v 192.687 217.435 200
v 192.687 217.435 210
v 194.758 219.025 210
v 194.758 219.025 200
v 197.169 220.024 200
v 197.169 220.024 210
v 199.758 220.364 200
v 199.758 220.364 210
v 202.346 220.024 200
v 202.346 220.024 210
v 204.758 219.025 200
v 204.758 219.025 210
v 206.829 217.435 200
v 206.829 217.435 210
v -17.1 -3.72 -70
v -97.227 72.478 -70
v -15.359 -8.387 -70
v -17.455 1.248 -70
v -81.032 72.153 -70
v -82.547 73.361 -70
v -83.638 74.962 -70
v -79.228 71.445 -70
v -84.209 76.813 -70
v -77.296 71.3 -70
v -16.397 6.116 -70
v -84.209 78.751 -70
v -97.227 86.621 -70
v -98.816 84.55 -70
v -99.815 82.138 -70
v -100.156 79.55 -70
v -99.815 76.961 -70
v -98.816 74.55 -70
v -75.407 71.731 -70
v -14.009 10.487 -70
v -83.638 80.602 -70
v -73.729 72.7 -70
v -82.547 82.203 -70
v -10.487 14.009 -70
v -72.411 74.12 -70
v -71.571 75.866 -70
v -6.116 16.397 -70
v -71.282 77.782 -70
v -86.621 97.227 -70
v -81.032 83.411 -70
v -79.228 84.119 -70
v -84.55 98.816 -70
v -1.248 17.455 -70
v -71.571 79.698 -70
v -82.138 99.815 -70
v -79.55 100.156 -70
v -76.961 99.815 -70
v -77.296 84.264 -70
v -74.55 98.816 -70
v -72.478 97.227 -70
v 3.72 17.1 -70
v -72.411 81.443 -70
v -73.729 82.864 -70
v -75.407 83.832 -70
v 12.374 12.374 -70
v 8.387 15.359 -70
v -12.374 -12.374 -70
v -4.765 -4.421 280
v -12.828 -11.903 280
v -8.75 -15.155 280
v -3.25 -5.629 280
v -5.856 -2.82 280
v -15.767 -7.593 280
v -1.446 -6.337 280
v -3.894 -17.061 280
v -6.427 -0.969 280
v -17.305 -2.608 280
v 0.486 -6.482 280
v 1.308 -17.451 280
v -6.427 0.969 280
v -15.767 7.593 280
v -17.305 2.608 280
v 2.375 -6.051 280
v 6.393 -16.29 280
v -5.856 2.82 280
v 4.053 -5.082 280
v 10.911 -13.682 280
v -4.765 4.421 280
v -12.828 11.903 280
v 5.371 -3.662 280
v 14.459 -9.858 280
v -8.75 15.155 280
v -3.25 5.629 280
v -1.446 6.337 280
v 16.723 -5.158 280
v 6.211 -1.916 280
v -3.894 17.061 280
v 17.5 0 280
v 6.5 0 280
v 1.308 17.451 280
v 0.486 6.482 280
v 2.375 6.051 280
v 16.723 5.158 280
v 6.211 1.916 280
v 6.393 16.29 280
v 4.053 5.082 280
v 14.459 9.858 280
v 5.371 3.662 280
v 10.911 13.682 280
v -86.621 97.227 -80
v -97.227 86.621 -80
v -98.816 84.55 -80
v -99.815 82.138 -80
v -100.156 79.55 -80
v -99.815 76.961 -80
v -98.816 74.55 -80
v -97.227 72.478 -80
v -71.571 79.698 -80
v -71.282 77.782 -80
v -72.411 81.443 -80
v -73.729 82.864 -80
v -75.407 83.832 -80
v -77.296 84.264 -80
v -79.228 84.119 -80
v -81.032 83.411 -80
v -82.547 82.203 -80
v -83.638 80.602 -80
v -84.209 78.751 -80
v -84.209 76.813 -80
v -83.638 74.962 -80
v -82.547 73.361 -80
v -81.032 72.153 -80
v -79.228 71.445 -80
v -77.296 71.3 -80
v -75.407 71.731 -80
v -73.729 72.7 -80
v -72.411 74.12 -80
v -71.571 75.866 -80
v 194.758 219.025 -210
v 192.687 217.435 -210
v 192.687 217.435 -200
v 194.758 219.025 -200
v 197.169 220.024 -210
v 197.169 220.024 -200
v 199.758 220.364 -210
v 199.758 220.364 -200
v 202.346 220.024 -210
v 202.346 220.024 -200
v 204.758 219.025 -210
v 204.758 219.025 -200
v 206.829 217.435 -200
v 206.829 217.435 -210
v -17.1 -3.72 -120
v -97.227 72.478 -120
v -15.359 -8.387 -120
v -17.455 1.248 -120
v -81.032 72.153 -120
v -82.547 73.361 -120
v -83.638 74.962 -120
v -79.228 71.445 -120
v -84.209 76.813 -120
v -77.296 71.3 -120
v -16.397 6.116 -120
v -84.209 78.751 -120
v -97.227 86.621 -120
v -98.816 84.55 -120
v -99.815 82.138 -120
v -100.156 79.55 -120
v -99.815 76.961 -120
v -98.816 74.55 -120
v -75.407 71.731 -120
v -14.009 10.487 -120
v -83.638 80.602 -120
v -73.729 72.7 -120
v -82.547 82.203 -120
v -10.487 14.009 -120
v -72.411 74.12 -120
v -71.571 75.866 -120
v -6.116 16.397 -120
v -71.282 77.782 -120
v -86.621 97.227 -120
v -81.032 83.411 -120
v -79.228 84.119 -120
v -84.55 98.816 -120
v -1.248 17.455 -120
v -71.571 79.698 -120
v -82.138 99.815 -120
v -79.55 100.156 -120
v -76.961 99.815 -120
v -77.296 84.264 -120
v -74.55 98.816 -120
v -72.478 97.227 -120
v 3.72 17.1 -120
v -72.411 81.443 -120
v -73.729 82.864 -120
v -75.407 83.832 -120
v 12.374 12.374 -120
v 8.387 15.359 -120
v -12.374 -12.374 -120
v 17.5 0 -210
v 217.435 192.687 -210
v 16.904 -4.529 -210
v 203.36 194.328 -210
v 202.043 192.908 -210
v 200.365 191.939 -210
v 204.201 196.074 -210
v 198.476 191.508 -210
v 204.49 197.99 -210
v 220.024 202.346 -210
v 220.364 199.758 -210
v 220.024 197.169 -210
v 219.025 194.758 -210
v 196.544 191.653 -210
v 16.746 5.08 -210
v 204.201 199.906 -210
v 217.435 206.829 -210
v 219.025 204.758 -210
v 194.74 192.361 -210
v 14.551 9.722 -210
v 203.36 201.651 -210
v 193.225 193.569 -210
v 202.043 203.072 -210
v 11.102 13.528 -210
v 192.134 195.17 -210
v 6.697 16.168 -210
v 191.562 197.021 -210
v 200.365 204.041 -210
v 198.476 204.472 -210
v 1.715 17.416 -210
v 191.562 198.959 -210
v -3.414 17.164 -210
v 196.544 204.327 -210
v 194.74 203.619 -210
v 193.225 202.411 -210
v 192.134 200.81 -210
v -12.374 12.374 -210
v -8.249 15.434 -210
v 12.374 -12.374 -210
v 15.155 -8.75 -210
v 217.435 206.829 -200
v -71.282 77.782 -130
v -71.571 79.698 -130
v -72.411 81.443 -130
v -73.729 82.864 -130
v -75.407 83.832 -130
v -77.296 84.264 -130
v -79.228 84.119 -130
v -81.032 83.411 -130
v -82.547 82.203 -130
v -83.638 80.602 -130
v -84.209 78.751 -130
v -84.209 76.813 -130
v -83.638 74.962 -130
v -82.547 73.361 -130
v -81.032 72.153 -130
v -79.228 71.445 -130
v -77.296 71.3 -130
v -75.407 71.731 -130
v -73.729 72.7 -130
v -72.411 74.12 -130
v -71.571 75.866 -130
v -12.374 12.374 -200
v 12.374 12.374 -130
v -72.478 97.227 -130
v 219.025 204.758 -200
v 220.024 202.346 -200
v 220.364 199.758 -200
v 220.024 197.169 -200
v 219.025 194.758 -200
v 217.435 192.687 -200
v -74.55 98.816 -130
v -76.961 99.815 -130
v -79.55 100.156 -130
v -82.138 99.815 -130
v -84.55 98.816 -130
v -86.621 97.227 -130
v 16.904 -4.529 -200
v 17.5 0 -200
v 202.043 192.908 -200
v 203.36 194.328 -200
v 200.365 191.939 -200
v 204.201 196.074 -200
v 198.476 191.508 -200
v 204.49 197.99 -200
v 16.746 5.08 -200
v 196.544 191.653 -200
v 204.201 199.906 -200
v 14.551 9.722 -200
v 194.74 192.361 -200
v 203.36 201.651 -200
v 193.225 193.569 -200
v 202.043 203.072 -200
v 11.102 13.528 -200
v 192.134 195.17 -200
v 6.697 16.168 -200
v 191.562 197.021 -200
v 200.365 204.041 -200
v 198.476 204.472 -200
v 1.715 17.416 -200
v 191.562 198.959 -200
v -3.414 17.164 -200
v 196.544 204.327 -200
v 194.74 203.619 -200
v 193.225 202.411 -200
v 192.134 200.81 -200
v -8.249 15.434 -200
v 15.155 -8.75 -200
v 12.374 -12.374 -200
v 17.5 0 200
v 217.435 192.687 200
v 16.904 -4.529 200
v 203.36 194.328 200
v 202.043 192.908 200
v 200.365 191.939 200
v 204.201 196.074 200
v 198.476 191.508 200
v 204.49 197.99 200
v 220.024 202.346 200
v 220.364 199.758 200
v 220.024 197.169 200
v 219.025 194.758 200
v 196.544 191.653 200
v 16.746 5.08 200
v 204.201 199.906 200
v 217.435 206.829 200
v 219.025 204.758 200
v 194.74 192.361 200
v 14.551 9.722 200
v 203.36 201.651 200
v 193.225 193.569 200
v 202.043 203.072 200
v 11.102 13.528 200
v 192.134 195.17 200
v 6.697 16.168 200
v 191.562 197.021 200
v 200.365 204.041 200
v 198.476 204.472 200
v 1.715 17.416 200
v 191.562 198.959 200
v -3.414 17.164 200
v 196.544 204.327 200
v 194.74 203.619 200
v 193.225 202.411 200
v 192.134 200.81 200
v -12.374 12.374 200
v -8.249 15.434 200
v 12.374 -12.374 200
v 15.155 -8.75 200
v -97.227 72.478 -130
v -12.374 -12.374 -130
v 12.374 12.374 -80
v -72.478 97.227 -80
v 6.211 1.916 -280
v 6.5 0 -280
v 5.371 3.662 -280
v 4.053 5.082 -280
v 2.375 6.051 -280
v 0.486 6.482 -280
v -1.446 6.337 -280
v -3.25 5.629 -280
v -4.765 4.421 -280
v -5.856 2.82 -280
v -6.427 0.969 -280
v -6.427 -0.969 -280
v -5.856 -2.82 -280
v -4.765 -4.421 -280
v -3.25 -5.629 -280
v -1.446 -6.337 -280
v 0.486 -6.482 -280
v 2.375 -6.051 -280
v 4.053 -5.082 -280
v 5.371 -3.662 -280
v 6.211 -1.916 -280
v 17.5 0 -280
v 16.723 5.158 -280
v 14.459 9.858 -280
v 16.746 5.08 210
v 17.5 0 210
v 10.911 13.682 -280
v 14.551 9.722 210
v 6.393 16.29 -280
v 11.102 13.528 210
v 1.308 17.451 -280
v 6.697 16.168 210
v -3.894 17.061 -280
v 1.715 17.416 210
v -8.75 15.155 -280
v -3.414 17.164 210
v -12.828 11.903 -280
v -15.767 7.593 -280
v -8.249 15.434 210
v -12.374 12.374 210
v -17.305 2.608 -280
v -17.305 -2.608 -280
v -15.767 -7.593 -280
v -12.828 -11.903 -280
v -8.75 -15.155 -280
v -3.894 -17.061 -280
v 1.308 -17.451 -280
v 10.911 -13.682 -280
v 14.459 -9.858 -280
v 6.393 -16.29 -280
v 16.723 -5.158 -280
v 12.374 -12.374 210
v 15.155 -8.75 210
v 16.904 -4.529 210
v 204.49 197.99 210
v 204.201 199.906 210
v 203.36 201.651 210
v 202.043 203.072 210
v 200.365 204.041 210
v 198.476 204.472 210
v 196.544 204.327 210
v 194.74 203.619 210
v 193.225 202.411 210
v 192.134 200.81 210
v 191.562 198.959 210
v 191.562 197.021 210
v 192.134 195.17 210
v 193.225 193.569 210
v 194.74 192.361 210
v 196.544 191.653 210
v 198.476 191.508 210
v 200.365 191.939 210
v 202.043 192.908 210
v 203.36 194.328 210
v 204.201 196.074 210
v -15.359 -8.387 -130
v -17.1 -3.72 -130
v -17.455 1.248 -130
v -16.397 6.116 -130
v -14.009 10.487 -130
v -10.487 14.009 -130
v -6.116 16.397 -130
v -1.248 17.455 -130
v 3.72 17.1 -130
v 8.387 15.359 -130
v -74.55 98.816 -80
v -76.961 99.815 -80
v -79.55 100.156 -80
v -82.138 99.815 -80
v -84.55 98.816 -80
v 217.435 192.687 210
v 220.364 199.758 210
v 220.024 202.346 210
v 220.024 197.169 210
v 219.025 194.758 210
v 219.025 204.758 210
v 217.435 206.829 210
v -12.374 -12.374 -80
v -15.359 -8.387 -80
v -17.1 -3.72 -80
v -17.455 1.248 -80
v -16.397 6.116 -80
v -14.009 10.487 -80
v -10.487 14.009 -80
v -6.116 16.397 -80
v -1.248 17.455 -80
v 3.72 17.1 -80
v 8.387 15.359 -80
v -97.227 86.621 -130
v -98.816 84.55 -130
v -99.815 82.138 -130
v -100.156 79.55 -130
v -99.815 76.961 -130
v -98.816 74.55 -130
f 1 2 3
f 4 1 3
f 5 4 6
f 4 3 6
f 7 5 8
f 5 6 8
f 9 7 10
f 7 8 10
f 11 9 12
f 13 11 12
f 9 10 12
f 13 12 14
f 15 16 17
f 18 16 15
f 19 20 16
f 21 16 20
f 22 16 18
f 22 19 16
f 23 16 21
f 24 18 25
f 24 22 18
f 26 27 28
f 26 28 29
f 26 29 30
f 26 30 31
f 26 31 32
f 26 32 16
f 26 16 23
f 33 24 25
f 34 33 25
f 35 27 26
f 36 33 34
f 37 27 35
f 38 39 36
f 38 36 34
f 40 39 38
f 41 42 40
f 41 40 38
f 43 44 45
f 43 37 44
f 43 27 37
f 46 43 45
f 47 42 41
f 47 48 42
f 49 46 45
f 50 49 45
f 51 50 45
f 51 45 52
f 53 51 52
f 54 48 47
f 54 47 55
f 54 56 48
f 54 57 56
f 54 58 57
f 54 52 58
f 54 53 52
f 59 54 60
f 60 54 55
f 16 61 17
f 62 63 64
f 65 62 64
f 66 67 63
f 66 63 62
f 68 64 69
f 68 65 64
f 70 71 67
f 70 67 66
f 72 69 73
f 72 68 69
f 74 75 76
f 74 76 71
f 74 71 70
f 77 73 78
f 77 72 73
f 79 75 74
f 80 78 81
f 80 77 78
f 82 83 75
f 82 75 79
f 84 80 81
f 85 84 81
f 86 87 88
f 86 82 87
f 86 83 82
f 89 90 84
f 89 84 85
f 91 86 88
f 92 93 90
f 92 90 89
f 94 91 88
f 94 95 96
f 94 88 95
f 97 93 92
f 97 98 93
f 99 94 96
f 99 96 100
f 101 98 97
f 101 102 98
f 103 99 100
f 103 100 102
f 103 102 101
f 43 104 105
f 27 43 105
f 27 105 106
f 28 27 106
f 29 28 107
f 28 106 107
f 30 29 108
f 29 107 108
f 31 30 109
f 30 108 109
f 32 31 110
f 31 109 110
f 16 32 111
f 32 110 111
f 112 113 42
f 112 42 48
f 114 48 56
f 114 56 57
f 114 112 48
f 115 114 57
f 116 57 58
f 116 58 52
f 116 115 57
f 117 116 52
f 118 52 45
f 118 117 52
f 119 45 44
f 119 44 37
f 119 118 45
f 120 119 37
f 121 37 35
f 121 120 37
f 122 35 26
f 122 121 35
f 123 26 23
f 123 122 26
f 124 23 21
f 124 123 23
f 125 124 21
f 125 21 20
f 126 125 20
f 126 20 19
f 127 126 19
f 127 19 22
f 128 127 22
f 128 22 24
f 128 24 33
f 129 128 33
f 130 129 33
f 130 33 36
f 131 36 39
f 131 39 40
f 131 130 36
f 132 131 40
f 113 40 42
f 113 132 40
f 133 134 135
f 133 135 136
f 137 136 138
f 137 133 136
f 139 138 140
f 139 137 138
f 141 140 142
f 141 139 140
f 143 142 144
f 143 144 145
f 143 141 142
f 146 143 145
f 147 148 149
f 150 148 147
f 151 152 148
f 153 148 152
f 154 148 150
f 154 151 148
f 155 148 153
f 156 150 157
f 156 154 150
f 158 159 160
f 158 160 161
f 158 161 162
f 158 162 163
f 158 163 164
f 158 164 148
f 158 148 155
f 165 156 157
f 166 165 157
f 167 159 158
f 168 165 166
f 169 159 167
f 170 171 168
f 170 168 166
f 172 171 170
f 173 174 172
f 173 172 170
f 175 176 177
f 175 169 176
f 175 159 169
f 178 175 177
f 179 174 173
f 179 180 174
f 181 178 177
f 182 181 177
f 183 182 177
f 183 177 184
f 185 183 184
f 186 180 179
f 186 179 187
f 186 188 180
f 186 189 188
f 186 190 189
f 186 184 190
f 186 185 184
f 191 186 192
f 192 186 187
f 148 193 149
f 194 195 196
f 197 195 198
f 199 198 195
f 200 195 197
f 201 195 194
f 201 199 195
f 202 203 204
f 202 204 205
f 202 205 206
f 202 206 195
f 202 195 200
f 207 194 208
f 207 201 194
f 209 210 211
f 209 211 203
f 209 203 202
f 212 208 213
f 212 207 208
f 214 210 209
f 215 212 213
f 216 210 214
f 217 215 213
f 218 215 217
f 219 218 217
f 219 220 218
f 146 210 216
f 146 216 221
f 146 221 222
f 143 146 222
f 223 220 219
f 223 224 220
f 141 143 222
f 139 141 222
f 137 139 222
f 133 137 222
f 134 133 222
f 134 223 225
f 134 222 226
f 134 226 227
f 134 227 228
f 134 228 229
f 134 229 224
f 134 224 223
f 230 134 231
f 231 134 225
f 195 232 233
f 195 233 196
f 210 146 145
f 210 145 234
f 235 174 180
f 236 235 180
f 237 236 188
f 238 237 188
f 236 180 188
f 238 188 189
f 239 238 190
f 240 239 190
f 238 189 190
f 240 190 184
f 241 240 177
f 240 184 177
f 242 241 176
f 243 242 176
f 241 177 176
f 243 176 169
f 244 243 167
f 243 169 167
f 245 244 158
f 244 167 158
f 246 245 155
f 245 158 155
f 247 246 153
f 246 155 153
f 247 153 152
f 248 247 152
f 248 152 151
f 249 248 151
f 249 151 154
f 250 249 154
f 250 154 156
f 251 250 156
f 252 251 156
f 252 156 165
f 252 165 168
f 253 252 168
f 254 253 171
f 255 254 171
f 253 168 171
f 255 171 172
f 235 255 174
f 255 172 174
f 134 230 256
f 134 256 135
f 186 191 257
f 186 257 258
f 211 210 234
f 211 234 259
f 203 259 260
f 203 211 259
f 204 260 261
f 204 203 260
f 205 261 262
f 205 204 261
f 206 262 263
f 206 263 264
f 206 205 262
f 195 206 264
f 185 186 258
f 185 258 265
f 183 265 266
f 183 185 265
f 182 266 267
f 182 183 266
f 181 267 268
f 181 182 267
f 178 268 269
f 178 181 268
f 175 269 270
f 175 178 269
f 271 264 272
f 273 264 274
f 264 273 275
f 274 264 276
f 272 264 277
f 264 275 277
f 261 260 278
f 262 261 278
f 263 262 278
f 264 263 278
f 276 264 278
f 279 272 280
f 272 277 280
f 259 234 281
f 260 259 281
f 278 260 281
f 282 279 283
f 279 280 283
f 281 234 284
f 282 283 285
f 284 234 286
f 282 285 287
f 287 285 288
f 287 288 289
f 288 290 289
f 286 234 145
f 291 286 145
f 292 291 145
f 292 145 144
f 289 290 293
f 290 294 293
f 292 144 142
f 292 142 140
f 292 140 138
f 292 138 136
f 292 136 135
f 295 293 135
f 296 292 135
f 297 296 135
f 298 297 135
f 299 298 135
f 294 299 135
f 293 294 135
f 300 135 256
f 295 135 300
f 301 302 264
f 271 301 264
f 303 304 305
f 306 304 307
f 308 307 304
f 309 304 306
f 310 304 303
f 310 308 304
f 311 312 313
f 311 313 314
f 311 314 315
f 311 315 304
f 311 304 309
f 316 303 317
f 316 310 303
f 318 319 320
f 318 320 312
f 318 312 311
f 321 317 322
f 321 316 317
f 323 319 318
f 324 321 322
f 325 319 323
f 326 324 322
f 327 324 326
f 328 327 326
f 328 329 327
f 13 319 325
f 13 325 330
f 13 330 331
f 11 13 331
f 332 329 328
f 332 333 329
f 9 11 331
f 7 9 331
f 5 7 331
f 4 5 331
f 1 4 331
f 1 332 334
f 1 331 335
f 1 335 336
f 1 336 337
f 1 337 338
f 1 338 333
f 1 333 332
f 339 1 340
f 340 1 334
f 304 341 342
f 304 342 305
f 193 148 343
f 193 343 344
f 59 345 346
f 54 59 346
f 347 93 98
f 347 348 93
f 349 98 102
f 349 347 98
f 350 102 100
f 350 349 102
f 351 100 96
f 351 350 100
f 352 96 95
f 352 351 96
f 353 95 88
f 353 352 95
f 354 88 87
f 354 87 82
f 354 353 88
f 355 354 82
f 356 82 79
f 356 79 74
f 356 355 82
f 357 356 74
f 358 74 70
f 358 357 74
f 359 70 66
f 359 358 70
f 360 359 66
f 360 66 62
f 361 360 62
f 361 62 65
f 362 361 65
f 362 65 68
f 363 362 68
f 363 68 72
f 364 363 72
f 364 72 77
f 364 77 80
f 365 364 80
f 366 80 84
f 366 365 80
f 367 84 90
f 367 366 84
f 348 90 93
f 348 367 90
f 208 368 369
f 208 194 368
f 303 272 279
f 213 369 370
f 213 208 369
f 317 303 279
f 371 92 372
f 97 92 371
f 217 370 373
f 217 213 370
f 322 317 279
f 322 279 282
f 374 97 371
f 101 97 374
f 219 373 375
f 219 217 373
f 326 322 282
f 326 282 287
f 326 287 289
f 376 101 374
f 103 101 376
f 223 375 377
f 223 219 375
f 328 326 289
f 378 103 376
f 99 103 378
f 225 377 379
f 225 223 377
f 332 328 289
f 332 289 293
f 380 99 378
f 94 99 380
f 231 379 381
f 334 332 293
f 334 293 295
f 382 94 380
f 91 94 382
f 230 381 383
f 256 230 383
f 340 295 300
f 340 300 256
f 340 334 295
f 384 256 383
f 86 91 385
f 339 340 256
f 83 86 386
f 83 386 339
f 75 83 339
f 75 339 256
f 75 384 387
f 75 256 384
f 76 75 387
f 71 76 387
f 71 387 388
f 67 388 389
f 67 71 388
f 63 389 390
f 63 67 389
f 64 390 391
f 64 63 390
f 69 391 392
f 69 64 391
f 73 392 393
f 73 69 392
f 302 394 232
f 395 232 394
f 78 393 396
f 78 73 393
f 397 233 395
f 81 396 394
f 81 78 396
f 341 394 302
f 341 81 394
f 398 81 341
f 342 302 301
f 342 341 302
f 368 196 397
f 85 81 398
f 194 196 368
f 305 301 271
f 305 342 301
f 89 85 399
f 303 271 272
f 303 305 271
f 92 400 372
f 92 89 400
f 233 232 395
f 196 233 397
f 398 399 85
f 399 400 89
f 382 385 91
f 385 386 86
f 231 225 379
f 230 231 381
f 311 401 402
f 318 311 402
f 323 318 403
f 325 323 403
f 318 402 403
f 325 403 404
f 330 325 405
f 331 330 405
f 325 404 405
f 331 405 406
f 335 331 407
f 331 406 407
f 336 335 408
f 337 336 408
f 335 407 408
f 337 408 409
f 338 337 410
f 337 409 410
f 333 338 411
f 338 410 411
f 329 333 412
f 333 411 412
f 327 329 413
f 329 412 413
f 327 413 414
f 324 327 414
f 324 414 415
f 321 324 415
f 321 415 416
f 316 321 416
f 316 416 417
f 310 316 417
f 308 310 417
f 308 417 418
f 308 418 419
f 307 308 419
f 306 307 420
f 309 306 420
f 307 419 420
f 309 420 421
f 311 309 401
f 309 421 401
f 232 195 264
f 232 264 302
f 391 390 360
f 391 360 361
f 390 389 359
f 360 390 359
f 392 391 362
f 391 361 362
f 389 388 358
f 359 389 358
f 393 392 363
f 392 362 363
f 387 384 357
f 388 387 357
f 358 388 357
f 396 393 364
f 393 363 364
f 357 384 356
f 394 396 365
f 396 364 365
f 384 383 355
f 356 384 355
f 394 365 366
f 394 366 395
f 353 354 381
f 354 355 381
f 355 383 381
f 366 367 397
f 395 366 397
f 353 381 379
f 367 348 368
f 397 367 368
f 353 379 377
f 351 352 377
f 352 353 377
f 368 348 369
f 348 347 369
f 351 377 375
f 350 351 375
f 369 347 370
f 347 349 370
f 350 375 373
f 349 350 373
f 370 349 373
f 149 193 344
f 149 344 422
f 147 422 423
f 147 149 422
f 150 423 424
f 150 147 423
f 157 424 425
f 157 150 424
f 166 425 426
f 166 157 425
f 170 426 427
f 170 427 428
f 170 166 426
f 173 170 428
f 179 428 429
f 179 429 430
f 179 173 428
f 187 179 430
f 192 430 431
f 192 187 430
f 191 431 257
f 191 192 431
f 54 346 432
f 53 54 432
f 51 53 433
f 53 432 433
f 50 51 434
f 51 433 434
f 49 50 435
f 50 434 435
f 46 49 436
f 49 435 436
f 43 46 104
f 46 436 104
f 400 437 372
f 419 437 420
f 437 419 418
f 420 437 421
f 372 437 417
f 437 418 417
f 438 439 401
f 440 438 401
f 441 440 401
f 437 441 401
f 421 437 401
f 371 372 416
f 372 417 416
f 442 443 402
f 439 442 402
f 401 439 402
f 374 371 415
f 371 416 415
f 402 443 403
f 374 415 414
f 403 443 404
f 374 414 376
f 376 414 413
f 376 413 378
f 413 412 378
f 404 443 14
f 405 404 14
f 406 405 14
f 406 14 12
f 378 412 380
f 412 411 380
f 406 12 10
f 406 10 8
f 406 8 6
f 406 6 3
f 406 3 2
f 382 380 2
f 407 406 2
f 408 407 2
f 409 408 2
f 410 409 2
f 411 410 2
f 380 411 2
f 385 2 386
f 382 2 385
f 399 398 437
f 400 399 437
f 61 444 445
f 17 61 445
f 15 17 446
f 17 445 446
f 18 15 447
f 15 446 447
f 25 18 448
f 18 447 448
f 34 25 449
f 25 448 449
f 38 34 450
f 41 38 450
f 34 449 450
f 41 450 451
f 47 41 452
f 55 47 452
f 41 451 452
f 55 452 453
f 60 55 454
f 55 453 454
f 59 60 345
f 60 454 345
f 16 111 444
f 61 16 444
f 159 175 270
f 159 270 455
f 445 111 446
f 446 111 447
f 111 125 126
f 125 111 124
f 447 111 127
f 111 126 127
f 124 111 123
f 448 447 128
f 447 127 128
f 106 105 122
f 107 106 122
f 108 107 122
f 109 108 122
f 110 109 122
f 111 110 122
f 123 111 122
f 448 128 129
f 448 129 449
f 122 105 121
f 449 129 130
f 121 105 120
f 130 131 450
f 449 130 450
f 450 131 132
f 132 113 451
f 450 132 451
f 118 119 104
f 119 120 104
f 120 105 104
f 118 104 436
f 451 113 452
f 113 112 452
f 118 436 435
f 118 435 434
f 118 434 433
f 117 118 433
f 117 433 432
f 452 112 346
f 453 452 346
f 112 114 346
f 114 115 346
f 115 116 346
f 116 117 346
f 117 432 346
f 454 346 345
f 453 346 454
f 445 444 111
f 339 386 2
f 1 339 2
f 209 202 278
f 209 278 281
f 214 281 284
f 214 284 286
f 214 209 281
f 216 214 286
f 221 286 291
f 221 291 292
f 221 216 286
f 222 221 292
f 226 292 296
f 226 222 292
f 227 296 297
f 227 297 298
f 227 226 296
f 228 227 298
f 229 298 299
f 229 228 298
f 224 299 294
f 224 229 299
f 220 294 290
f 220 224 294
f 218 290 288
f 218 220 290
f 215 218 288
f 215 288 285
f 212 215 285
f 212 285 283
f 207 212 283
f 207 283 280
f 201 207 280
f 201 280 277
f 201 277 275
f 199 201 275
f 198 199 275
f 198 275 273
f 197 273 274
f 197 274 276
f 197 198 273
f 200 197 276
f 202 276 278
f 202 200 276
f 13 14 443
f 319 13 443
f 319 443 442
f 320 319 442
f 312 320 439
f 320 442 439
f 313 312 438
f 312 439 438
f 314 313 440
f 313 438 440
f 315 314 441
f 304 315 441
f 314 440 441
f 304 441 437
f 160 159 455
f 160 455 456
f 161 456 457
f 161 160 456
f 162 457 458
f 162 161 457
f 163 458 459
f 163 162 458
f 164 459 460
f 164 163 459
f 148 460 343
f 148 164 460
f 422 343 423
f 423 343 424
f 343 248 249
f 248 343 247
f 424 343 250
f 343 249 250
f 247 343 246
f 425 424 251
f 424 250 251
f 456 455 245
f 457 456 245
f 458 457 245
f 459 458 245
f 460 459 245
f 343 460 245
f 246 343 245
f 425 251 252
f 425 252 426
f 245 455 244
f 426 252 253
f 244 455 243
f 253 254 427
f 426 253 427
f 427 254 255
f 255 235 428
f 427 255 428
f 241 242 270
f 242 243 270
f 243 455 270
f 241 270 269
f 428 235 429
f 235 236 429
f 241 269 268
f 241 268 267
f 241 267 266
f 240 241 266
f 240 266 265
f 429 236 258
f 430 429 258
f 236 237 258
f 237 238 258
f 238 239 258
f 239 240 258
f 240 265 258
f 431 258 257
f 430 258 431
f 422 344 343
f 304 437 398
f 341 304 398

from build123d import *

# Parameters (mm, degrees)
SKETCH1_R           = 17.5
SKETCH1_R_2         = 6.5
BOSS_EXTRUDE1_DEPTH = 280
SKETCH2_R           = 6.5
BOSS_EXTRUDE2_DEPTH = 10
SKETCH3_R           = 6.5
BOSS_EXTRUDE3_DEPTH = 10


with BuildPart() as part:
    # Sketch1 → Boss-Extrude1 (new, symmetric)
    with BuildSketch(Plane.XY):
        Circle(SKETCH1_R)
        Circle(SKETCH1_R_2, mode=Mode.SUBTRACT)
    extrude(amount=BOSS_EXTRUDE1_DEPTH, both=True)

    # Sketch2 → Boss-Extrude2 (add)
    with BuildSketch(Plane.XY.offset(210)):
        with BuildLine():
            Line((-12.374368671, 12.374368671), (192.686597873, 217.435335215))
            ThreePointArc((192.686597873, 217.435335215), (199.757665685, 220.364267403), (206.828733497, 217.435335215))
            Line((206.828733497, 217.435335215), (217.435335215, 206.828733497))
            ThreePointArc((217.435335215, 206.828733497), (220.364267403, 199.757665685), (217.435335215, 192.686597873))
            Line((217.435335215, 192.686597873), (12.374368671, -12.374368671))
            ThreePointArc((12.374368671, -12.374368671), (12.374368671, 12.374368671), (-12.374368671, 12.374368671))
        make_face()
        with Locations((197.989898732, 197.989898732)):
            Circle(SKETCH2_R, mode=Mode.SUBTRACT)
    boss_extrude2 = extrude(amount=-BOSS_EXTRUDE2_DEPTH)

    # Mirror1: Boss-Extrude2 across plane
    add(boss_extrude2.mirror(Plane.XY))


with BuildPart() as body_2:
    # Sketch3 → Boss-Extrude3 (new body)
    with BuildSketch(Plane.XY.offset(-120)):
        with BuildLine():
            Line((12.374368671, 12.374368671), (-72.478445072, 97.227182413))
            ThreePointArc((-72.478445072, 97.227182413), (-79.549512883, 100.156114601), (-86.620580695, 97.227182413))
            Line((-86.620580695, 97.227182413), (-97.227182413, 86.620580695))
            ThreePointArc((-97.227182413, 86.620580695), (-100.156114601, 79.549512883), (-97.227182413, 72.478445072))
            Line((-97.227182413, 72.478445072), (-12.374368671, -12.374368671))
            ThreePointArc((-12.374368671, -12.374368671), (-12.374368671, 12.374368671), (12.374368671, 12.374368671))
        make_face()
        with Locations((-77.781745931, 77.781745931)):
            Circle(SKETCH3_R, mode=Mode.SUBTRACT)
    extrude(amount=-BOSS_EXTRUDE3_DEPTH)


with BuildPart() as body_3:
    # Mirror2: mirrored copy
    add(body_2.part.mirror(Plane(origin=(0, 0, -100), x_dir=(1, 0, 0), z_dir=(0, 0, -1))))


solid = Compound([part.part, body_2.part, body_3.part])
